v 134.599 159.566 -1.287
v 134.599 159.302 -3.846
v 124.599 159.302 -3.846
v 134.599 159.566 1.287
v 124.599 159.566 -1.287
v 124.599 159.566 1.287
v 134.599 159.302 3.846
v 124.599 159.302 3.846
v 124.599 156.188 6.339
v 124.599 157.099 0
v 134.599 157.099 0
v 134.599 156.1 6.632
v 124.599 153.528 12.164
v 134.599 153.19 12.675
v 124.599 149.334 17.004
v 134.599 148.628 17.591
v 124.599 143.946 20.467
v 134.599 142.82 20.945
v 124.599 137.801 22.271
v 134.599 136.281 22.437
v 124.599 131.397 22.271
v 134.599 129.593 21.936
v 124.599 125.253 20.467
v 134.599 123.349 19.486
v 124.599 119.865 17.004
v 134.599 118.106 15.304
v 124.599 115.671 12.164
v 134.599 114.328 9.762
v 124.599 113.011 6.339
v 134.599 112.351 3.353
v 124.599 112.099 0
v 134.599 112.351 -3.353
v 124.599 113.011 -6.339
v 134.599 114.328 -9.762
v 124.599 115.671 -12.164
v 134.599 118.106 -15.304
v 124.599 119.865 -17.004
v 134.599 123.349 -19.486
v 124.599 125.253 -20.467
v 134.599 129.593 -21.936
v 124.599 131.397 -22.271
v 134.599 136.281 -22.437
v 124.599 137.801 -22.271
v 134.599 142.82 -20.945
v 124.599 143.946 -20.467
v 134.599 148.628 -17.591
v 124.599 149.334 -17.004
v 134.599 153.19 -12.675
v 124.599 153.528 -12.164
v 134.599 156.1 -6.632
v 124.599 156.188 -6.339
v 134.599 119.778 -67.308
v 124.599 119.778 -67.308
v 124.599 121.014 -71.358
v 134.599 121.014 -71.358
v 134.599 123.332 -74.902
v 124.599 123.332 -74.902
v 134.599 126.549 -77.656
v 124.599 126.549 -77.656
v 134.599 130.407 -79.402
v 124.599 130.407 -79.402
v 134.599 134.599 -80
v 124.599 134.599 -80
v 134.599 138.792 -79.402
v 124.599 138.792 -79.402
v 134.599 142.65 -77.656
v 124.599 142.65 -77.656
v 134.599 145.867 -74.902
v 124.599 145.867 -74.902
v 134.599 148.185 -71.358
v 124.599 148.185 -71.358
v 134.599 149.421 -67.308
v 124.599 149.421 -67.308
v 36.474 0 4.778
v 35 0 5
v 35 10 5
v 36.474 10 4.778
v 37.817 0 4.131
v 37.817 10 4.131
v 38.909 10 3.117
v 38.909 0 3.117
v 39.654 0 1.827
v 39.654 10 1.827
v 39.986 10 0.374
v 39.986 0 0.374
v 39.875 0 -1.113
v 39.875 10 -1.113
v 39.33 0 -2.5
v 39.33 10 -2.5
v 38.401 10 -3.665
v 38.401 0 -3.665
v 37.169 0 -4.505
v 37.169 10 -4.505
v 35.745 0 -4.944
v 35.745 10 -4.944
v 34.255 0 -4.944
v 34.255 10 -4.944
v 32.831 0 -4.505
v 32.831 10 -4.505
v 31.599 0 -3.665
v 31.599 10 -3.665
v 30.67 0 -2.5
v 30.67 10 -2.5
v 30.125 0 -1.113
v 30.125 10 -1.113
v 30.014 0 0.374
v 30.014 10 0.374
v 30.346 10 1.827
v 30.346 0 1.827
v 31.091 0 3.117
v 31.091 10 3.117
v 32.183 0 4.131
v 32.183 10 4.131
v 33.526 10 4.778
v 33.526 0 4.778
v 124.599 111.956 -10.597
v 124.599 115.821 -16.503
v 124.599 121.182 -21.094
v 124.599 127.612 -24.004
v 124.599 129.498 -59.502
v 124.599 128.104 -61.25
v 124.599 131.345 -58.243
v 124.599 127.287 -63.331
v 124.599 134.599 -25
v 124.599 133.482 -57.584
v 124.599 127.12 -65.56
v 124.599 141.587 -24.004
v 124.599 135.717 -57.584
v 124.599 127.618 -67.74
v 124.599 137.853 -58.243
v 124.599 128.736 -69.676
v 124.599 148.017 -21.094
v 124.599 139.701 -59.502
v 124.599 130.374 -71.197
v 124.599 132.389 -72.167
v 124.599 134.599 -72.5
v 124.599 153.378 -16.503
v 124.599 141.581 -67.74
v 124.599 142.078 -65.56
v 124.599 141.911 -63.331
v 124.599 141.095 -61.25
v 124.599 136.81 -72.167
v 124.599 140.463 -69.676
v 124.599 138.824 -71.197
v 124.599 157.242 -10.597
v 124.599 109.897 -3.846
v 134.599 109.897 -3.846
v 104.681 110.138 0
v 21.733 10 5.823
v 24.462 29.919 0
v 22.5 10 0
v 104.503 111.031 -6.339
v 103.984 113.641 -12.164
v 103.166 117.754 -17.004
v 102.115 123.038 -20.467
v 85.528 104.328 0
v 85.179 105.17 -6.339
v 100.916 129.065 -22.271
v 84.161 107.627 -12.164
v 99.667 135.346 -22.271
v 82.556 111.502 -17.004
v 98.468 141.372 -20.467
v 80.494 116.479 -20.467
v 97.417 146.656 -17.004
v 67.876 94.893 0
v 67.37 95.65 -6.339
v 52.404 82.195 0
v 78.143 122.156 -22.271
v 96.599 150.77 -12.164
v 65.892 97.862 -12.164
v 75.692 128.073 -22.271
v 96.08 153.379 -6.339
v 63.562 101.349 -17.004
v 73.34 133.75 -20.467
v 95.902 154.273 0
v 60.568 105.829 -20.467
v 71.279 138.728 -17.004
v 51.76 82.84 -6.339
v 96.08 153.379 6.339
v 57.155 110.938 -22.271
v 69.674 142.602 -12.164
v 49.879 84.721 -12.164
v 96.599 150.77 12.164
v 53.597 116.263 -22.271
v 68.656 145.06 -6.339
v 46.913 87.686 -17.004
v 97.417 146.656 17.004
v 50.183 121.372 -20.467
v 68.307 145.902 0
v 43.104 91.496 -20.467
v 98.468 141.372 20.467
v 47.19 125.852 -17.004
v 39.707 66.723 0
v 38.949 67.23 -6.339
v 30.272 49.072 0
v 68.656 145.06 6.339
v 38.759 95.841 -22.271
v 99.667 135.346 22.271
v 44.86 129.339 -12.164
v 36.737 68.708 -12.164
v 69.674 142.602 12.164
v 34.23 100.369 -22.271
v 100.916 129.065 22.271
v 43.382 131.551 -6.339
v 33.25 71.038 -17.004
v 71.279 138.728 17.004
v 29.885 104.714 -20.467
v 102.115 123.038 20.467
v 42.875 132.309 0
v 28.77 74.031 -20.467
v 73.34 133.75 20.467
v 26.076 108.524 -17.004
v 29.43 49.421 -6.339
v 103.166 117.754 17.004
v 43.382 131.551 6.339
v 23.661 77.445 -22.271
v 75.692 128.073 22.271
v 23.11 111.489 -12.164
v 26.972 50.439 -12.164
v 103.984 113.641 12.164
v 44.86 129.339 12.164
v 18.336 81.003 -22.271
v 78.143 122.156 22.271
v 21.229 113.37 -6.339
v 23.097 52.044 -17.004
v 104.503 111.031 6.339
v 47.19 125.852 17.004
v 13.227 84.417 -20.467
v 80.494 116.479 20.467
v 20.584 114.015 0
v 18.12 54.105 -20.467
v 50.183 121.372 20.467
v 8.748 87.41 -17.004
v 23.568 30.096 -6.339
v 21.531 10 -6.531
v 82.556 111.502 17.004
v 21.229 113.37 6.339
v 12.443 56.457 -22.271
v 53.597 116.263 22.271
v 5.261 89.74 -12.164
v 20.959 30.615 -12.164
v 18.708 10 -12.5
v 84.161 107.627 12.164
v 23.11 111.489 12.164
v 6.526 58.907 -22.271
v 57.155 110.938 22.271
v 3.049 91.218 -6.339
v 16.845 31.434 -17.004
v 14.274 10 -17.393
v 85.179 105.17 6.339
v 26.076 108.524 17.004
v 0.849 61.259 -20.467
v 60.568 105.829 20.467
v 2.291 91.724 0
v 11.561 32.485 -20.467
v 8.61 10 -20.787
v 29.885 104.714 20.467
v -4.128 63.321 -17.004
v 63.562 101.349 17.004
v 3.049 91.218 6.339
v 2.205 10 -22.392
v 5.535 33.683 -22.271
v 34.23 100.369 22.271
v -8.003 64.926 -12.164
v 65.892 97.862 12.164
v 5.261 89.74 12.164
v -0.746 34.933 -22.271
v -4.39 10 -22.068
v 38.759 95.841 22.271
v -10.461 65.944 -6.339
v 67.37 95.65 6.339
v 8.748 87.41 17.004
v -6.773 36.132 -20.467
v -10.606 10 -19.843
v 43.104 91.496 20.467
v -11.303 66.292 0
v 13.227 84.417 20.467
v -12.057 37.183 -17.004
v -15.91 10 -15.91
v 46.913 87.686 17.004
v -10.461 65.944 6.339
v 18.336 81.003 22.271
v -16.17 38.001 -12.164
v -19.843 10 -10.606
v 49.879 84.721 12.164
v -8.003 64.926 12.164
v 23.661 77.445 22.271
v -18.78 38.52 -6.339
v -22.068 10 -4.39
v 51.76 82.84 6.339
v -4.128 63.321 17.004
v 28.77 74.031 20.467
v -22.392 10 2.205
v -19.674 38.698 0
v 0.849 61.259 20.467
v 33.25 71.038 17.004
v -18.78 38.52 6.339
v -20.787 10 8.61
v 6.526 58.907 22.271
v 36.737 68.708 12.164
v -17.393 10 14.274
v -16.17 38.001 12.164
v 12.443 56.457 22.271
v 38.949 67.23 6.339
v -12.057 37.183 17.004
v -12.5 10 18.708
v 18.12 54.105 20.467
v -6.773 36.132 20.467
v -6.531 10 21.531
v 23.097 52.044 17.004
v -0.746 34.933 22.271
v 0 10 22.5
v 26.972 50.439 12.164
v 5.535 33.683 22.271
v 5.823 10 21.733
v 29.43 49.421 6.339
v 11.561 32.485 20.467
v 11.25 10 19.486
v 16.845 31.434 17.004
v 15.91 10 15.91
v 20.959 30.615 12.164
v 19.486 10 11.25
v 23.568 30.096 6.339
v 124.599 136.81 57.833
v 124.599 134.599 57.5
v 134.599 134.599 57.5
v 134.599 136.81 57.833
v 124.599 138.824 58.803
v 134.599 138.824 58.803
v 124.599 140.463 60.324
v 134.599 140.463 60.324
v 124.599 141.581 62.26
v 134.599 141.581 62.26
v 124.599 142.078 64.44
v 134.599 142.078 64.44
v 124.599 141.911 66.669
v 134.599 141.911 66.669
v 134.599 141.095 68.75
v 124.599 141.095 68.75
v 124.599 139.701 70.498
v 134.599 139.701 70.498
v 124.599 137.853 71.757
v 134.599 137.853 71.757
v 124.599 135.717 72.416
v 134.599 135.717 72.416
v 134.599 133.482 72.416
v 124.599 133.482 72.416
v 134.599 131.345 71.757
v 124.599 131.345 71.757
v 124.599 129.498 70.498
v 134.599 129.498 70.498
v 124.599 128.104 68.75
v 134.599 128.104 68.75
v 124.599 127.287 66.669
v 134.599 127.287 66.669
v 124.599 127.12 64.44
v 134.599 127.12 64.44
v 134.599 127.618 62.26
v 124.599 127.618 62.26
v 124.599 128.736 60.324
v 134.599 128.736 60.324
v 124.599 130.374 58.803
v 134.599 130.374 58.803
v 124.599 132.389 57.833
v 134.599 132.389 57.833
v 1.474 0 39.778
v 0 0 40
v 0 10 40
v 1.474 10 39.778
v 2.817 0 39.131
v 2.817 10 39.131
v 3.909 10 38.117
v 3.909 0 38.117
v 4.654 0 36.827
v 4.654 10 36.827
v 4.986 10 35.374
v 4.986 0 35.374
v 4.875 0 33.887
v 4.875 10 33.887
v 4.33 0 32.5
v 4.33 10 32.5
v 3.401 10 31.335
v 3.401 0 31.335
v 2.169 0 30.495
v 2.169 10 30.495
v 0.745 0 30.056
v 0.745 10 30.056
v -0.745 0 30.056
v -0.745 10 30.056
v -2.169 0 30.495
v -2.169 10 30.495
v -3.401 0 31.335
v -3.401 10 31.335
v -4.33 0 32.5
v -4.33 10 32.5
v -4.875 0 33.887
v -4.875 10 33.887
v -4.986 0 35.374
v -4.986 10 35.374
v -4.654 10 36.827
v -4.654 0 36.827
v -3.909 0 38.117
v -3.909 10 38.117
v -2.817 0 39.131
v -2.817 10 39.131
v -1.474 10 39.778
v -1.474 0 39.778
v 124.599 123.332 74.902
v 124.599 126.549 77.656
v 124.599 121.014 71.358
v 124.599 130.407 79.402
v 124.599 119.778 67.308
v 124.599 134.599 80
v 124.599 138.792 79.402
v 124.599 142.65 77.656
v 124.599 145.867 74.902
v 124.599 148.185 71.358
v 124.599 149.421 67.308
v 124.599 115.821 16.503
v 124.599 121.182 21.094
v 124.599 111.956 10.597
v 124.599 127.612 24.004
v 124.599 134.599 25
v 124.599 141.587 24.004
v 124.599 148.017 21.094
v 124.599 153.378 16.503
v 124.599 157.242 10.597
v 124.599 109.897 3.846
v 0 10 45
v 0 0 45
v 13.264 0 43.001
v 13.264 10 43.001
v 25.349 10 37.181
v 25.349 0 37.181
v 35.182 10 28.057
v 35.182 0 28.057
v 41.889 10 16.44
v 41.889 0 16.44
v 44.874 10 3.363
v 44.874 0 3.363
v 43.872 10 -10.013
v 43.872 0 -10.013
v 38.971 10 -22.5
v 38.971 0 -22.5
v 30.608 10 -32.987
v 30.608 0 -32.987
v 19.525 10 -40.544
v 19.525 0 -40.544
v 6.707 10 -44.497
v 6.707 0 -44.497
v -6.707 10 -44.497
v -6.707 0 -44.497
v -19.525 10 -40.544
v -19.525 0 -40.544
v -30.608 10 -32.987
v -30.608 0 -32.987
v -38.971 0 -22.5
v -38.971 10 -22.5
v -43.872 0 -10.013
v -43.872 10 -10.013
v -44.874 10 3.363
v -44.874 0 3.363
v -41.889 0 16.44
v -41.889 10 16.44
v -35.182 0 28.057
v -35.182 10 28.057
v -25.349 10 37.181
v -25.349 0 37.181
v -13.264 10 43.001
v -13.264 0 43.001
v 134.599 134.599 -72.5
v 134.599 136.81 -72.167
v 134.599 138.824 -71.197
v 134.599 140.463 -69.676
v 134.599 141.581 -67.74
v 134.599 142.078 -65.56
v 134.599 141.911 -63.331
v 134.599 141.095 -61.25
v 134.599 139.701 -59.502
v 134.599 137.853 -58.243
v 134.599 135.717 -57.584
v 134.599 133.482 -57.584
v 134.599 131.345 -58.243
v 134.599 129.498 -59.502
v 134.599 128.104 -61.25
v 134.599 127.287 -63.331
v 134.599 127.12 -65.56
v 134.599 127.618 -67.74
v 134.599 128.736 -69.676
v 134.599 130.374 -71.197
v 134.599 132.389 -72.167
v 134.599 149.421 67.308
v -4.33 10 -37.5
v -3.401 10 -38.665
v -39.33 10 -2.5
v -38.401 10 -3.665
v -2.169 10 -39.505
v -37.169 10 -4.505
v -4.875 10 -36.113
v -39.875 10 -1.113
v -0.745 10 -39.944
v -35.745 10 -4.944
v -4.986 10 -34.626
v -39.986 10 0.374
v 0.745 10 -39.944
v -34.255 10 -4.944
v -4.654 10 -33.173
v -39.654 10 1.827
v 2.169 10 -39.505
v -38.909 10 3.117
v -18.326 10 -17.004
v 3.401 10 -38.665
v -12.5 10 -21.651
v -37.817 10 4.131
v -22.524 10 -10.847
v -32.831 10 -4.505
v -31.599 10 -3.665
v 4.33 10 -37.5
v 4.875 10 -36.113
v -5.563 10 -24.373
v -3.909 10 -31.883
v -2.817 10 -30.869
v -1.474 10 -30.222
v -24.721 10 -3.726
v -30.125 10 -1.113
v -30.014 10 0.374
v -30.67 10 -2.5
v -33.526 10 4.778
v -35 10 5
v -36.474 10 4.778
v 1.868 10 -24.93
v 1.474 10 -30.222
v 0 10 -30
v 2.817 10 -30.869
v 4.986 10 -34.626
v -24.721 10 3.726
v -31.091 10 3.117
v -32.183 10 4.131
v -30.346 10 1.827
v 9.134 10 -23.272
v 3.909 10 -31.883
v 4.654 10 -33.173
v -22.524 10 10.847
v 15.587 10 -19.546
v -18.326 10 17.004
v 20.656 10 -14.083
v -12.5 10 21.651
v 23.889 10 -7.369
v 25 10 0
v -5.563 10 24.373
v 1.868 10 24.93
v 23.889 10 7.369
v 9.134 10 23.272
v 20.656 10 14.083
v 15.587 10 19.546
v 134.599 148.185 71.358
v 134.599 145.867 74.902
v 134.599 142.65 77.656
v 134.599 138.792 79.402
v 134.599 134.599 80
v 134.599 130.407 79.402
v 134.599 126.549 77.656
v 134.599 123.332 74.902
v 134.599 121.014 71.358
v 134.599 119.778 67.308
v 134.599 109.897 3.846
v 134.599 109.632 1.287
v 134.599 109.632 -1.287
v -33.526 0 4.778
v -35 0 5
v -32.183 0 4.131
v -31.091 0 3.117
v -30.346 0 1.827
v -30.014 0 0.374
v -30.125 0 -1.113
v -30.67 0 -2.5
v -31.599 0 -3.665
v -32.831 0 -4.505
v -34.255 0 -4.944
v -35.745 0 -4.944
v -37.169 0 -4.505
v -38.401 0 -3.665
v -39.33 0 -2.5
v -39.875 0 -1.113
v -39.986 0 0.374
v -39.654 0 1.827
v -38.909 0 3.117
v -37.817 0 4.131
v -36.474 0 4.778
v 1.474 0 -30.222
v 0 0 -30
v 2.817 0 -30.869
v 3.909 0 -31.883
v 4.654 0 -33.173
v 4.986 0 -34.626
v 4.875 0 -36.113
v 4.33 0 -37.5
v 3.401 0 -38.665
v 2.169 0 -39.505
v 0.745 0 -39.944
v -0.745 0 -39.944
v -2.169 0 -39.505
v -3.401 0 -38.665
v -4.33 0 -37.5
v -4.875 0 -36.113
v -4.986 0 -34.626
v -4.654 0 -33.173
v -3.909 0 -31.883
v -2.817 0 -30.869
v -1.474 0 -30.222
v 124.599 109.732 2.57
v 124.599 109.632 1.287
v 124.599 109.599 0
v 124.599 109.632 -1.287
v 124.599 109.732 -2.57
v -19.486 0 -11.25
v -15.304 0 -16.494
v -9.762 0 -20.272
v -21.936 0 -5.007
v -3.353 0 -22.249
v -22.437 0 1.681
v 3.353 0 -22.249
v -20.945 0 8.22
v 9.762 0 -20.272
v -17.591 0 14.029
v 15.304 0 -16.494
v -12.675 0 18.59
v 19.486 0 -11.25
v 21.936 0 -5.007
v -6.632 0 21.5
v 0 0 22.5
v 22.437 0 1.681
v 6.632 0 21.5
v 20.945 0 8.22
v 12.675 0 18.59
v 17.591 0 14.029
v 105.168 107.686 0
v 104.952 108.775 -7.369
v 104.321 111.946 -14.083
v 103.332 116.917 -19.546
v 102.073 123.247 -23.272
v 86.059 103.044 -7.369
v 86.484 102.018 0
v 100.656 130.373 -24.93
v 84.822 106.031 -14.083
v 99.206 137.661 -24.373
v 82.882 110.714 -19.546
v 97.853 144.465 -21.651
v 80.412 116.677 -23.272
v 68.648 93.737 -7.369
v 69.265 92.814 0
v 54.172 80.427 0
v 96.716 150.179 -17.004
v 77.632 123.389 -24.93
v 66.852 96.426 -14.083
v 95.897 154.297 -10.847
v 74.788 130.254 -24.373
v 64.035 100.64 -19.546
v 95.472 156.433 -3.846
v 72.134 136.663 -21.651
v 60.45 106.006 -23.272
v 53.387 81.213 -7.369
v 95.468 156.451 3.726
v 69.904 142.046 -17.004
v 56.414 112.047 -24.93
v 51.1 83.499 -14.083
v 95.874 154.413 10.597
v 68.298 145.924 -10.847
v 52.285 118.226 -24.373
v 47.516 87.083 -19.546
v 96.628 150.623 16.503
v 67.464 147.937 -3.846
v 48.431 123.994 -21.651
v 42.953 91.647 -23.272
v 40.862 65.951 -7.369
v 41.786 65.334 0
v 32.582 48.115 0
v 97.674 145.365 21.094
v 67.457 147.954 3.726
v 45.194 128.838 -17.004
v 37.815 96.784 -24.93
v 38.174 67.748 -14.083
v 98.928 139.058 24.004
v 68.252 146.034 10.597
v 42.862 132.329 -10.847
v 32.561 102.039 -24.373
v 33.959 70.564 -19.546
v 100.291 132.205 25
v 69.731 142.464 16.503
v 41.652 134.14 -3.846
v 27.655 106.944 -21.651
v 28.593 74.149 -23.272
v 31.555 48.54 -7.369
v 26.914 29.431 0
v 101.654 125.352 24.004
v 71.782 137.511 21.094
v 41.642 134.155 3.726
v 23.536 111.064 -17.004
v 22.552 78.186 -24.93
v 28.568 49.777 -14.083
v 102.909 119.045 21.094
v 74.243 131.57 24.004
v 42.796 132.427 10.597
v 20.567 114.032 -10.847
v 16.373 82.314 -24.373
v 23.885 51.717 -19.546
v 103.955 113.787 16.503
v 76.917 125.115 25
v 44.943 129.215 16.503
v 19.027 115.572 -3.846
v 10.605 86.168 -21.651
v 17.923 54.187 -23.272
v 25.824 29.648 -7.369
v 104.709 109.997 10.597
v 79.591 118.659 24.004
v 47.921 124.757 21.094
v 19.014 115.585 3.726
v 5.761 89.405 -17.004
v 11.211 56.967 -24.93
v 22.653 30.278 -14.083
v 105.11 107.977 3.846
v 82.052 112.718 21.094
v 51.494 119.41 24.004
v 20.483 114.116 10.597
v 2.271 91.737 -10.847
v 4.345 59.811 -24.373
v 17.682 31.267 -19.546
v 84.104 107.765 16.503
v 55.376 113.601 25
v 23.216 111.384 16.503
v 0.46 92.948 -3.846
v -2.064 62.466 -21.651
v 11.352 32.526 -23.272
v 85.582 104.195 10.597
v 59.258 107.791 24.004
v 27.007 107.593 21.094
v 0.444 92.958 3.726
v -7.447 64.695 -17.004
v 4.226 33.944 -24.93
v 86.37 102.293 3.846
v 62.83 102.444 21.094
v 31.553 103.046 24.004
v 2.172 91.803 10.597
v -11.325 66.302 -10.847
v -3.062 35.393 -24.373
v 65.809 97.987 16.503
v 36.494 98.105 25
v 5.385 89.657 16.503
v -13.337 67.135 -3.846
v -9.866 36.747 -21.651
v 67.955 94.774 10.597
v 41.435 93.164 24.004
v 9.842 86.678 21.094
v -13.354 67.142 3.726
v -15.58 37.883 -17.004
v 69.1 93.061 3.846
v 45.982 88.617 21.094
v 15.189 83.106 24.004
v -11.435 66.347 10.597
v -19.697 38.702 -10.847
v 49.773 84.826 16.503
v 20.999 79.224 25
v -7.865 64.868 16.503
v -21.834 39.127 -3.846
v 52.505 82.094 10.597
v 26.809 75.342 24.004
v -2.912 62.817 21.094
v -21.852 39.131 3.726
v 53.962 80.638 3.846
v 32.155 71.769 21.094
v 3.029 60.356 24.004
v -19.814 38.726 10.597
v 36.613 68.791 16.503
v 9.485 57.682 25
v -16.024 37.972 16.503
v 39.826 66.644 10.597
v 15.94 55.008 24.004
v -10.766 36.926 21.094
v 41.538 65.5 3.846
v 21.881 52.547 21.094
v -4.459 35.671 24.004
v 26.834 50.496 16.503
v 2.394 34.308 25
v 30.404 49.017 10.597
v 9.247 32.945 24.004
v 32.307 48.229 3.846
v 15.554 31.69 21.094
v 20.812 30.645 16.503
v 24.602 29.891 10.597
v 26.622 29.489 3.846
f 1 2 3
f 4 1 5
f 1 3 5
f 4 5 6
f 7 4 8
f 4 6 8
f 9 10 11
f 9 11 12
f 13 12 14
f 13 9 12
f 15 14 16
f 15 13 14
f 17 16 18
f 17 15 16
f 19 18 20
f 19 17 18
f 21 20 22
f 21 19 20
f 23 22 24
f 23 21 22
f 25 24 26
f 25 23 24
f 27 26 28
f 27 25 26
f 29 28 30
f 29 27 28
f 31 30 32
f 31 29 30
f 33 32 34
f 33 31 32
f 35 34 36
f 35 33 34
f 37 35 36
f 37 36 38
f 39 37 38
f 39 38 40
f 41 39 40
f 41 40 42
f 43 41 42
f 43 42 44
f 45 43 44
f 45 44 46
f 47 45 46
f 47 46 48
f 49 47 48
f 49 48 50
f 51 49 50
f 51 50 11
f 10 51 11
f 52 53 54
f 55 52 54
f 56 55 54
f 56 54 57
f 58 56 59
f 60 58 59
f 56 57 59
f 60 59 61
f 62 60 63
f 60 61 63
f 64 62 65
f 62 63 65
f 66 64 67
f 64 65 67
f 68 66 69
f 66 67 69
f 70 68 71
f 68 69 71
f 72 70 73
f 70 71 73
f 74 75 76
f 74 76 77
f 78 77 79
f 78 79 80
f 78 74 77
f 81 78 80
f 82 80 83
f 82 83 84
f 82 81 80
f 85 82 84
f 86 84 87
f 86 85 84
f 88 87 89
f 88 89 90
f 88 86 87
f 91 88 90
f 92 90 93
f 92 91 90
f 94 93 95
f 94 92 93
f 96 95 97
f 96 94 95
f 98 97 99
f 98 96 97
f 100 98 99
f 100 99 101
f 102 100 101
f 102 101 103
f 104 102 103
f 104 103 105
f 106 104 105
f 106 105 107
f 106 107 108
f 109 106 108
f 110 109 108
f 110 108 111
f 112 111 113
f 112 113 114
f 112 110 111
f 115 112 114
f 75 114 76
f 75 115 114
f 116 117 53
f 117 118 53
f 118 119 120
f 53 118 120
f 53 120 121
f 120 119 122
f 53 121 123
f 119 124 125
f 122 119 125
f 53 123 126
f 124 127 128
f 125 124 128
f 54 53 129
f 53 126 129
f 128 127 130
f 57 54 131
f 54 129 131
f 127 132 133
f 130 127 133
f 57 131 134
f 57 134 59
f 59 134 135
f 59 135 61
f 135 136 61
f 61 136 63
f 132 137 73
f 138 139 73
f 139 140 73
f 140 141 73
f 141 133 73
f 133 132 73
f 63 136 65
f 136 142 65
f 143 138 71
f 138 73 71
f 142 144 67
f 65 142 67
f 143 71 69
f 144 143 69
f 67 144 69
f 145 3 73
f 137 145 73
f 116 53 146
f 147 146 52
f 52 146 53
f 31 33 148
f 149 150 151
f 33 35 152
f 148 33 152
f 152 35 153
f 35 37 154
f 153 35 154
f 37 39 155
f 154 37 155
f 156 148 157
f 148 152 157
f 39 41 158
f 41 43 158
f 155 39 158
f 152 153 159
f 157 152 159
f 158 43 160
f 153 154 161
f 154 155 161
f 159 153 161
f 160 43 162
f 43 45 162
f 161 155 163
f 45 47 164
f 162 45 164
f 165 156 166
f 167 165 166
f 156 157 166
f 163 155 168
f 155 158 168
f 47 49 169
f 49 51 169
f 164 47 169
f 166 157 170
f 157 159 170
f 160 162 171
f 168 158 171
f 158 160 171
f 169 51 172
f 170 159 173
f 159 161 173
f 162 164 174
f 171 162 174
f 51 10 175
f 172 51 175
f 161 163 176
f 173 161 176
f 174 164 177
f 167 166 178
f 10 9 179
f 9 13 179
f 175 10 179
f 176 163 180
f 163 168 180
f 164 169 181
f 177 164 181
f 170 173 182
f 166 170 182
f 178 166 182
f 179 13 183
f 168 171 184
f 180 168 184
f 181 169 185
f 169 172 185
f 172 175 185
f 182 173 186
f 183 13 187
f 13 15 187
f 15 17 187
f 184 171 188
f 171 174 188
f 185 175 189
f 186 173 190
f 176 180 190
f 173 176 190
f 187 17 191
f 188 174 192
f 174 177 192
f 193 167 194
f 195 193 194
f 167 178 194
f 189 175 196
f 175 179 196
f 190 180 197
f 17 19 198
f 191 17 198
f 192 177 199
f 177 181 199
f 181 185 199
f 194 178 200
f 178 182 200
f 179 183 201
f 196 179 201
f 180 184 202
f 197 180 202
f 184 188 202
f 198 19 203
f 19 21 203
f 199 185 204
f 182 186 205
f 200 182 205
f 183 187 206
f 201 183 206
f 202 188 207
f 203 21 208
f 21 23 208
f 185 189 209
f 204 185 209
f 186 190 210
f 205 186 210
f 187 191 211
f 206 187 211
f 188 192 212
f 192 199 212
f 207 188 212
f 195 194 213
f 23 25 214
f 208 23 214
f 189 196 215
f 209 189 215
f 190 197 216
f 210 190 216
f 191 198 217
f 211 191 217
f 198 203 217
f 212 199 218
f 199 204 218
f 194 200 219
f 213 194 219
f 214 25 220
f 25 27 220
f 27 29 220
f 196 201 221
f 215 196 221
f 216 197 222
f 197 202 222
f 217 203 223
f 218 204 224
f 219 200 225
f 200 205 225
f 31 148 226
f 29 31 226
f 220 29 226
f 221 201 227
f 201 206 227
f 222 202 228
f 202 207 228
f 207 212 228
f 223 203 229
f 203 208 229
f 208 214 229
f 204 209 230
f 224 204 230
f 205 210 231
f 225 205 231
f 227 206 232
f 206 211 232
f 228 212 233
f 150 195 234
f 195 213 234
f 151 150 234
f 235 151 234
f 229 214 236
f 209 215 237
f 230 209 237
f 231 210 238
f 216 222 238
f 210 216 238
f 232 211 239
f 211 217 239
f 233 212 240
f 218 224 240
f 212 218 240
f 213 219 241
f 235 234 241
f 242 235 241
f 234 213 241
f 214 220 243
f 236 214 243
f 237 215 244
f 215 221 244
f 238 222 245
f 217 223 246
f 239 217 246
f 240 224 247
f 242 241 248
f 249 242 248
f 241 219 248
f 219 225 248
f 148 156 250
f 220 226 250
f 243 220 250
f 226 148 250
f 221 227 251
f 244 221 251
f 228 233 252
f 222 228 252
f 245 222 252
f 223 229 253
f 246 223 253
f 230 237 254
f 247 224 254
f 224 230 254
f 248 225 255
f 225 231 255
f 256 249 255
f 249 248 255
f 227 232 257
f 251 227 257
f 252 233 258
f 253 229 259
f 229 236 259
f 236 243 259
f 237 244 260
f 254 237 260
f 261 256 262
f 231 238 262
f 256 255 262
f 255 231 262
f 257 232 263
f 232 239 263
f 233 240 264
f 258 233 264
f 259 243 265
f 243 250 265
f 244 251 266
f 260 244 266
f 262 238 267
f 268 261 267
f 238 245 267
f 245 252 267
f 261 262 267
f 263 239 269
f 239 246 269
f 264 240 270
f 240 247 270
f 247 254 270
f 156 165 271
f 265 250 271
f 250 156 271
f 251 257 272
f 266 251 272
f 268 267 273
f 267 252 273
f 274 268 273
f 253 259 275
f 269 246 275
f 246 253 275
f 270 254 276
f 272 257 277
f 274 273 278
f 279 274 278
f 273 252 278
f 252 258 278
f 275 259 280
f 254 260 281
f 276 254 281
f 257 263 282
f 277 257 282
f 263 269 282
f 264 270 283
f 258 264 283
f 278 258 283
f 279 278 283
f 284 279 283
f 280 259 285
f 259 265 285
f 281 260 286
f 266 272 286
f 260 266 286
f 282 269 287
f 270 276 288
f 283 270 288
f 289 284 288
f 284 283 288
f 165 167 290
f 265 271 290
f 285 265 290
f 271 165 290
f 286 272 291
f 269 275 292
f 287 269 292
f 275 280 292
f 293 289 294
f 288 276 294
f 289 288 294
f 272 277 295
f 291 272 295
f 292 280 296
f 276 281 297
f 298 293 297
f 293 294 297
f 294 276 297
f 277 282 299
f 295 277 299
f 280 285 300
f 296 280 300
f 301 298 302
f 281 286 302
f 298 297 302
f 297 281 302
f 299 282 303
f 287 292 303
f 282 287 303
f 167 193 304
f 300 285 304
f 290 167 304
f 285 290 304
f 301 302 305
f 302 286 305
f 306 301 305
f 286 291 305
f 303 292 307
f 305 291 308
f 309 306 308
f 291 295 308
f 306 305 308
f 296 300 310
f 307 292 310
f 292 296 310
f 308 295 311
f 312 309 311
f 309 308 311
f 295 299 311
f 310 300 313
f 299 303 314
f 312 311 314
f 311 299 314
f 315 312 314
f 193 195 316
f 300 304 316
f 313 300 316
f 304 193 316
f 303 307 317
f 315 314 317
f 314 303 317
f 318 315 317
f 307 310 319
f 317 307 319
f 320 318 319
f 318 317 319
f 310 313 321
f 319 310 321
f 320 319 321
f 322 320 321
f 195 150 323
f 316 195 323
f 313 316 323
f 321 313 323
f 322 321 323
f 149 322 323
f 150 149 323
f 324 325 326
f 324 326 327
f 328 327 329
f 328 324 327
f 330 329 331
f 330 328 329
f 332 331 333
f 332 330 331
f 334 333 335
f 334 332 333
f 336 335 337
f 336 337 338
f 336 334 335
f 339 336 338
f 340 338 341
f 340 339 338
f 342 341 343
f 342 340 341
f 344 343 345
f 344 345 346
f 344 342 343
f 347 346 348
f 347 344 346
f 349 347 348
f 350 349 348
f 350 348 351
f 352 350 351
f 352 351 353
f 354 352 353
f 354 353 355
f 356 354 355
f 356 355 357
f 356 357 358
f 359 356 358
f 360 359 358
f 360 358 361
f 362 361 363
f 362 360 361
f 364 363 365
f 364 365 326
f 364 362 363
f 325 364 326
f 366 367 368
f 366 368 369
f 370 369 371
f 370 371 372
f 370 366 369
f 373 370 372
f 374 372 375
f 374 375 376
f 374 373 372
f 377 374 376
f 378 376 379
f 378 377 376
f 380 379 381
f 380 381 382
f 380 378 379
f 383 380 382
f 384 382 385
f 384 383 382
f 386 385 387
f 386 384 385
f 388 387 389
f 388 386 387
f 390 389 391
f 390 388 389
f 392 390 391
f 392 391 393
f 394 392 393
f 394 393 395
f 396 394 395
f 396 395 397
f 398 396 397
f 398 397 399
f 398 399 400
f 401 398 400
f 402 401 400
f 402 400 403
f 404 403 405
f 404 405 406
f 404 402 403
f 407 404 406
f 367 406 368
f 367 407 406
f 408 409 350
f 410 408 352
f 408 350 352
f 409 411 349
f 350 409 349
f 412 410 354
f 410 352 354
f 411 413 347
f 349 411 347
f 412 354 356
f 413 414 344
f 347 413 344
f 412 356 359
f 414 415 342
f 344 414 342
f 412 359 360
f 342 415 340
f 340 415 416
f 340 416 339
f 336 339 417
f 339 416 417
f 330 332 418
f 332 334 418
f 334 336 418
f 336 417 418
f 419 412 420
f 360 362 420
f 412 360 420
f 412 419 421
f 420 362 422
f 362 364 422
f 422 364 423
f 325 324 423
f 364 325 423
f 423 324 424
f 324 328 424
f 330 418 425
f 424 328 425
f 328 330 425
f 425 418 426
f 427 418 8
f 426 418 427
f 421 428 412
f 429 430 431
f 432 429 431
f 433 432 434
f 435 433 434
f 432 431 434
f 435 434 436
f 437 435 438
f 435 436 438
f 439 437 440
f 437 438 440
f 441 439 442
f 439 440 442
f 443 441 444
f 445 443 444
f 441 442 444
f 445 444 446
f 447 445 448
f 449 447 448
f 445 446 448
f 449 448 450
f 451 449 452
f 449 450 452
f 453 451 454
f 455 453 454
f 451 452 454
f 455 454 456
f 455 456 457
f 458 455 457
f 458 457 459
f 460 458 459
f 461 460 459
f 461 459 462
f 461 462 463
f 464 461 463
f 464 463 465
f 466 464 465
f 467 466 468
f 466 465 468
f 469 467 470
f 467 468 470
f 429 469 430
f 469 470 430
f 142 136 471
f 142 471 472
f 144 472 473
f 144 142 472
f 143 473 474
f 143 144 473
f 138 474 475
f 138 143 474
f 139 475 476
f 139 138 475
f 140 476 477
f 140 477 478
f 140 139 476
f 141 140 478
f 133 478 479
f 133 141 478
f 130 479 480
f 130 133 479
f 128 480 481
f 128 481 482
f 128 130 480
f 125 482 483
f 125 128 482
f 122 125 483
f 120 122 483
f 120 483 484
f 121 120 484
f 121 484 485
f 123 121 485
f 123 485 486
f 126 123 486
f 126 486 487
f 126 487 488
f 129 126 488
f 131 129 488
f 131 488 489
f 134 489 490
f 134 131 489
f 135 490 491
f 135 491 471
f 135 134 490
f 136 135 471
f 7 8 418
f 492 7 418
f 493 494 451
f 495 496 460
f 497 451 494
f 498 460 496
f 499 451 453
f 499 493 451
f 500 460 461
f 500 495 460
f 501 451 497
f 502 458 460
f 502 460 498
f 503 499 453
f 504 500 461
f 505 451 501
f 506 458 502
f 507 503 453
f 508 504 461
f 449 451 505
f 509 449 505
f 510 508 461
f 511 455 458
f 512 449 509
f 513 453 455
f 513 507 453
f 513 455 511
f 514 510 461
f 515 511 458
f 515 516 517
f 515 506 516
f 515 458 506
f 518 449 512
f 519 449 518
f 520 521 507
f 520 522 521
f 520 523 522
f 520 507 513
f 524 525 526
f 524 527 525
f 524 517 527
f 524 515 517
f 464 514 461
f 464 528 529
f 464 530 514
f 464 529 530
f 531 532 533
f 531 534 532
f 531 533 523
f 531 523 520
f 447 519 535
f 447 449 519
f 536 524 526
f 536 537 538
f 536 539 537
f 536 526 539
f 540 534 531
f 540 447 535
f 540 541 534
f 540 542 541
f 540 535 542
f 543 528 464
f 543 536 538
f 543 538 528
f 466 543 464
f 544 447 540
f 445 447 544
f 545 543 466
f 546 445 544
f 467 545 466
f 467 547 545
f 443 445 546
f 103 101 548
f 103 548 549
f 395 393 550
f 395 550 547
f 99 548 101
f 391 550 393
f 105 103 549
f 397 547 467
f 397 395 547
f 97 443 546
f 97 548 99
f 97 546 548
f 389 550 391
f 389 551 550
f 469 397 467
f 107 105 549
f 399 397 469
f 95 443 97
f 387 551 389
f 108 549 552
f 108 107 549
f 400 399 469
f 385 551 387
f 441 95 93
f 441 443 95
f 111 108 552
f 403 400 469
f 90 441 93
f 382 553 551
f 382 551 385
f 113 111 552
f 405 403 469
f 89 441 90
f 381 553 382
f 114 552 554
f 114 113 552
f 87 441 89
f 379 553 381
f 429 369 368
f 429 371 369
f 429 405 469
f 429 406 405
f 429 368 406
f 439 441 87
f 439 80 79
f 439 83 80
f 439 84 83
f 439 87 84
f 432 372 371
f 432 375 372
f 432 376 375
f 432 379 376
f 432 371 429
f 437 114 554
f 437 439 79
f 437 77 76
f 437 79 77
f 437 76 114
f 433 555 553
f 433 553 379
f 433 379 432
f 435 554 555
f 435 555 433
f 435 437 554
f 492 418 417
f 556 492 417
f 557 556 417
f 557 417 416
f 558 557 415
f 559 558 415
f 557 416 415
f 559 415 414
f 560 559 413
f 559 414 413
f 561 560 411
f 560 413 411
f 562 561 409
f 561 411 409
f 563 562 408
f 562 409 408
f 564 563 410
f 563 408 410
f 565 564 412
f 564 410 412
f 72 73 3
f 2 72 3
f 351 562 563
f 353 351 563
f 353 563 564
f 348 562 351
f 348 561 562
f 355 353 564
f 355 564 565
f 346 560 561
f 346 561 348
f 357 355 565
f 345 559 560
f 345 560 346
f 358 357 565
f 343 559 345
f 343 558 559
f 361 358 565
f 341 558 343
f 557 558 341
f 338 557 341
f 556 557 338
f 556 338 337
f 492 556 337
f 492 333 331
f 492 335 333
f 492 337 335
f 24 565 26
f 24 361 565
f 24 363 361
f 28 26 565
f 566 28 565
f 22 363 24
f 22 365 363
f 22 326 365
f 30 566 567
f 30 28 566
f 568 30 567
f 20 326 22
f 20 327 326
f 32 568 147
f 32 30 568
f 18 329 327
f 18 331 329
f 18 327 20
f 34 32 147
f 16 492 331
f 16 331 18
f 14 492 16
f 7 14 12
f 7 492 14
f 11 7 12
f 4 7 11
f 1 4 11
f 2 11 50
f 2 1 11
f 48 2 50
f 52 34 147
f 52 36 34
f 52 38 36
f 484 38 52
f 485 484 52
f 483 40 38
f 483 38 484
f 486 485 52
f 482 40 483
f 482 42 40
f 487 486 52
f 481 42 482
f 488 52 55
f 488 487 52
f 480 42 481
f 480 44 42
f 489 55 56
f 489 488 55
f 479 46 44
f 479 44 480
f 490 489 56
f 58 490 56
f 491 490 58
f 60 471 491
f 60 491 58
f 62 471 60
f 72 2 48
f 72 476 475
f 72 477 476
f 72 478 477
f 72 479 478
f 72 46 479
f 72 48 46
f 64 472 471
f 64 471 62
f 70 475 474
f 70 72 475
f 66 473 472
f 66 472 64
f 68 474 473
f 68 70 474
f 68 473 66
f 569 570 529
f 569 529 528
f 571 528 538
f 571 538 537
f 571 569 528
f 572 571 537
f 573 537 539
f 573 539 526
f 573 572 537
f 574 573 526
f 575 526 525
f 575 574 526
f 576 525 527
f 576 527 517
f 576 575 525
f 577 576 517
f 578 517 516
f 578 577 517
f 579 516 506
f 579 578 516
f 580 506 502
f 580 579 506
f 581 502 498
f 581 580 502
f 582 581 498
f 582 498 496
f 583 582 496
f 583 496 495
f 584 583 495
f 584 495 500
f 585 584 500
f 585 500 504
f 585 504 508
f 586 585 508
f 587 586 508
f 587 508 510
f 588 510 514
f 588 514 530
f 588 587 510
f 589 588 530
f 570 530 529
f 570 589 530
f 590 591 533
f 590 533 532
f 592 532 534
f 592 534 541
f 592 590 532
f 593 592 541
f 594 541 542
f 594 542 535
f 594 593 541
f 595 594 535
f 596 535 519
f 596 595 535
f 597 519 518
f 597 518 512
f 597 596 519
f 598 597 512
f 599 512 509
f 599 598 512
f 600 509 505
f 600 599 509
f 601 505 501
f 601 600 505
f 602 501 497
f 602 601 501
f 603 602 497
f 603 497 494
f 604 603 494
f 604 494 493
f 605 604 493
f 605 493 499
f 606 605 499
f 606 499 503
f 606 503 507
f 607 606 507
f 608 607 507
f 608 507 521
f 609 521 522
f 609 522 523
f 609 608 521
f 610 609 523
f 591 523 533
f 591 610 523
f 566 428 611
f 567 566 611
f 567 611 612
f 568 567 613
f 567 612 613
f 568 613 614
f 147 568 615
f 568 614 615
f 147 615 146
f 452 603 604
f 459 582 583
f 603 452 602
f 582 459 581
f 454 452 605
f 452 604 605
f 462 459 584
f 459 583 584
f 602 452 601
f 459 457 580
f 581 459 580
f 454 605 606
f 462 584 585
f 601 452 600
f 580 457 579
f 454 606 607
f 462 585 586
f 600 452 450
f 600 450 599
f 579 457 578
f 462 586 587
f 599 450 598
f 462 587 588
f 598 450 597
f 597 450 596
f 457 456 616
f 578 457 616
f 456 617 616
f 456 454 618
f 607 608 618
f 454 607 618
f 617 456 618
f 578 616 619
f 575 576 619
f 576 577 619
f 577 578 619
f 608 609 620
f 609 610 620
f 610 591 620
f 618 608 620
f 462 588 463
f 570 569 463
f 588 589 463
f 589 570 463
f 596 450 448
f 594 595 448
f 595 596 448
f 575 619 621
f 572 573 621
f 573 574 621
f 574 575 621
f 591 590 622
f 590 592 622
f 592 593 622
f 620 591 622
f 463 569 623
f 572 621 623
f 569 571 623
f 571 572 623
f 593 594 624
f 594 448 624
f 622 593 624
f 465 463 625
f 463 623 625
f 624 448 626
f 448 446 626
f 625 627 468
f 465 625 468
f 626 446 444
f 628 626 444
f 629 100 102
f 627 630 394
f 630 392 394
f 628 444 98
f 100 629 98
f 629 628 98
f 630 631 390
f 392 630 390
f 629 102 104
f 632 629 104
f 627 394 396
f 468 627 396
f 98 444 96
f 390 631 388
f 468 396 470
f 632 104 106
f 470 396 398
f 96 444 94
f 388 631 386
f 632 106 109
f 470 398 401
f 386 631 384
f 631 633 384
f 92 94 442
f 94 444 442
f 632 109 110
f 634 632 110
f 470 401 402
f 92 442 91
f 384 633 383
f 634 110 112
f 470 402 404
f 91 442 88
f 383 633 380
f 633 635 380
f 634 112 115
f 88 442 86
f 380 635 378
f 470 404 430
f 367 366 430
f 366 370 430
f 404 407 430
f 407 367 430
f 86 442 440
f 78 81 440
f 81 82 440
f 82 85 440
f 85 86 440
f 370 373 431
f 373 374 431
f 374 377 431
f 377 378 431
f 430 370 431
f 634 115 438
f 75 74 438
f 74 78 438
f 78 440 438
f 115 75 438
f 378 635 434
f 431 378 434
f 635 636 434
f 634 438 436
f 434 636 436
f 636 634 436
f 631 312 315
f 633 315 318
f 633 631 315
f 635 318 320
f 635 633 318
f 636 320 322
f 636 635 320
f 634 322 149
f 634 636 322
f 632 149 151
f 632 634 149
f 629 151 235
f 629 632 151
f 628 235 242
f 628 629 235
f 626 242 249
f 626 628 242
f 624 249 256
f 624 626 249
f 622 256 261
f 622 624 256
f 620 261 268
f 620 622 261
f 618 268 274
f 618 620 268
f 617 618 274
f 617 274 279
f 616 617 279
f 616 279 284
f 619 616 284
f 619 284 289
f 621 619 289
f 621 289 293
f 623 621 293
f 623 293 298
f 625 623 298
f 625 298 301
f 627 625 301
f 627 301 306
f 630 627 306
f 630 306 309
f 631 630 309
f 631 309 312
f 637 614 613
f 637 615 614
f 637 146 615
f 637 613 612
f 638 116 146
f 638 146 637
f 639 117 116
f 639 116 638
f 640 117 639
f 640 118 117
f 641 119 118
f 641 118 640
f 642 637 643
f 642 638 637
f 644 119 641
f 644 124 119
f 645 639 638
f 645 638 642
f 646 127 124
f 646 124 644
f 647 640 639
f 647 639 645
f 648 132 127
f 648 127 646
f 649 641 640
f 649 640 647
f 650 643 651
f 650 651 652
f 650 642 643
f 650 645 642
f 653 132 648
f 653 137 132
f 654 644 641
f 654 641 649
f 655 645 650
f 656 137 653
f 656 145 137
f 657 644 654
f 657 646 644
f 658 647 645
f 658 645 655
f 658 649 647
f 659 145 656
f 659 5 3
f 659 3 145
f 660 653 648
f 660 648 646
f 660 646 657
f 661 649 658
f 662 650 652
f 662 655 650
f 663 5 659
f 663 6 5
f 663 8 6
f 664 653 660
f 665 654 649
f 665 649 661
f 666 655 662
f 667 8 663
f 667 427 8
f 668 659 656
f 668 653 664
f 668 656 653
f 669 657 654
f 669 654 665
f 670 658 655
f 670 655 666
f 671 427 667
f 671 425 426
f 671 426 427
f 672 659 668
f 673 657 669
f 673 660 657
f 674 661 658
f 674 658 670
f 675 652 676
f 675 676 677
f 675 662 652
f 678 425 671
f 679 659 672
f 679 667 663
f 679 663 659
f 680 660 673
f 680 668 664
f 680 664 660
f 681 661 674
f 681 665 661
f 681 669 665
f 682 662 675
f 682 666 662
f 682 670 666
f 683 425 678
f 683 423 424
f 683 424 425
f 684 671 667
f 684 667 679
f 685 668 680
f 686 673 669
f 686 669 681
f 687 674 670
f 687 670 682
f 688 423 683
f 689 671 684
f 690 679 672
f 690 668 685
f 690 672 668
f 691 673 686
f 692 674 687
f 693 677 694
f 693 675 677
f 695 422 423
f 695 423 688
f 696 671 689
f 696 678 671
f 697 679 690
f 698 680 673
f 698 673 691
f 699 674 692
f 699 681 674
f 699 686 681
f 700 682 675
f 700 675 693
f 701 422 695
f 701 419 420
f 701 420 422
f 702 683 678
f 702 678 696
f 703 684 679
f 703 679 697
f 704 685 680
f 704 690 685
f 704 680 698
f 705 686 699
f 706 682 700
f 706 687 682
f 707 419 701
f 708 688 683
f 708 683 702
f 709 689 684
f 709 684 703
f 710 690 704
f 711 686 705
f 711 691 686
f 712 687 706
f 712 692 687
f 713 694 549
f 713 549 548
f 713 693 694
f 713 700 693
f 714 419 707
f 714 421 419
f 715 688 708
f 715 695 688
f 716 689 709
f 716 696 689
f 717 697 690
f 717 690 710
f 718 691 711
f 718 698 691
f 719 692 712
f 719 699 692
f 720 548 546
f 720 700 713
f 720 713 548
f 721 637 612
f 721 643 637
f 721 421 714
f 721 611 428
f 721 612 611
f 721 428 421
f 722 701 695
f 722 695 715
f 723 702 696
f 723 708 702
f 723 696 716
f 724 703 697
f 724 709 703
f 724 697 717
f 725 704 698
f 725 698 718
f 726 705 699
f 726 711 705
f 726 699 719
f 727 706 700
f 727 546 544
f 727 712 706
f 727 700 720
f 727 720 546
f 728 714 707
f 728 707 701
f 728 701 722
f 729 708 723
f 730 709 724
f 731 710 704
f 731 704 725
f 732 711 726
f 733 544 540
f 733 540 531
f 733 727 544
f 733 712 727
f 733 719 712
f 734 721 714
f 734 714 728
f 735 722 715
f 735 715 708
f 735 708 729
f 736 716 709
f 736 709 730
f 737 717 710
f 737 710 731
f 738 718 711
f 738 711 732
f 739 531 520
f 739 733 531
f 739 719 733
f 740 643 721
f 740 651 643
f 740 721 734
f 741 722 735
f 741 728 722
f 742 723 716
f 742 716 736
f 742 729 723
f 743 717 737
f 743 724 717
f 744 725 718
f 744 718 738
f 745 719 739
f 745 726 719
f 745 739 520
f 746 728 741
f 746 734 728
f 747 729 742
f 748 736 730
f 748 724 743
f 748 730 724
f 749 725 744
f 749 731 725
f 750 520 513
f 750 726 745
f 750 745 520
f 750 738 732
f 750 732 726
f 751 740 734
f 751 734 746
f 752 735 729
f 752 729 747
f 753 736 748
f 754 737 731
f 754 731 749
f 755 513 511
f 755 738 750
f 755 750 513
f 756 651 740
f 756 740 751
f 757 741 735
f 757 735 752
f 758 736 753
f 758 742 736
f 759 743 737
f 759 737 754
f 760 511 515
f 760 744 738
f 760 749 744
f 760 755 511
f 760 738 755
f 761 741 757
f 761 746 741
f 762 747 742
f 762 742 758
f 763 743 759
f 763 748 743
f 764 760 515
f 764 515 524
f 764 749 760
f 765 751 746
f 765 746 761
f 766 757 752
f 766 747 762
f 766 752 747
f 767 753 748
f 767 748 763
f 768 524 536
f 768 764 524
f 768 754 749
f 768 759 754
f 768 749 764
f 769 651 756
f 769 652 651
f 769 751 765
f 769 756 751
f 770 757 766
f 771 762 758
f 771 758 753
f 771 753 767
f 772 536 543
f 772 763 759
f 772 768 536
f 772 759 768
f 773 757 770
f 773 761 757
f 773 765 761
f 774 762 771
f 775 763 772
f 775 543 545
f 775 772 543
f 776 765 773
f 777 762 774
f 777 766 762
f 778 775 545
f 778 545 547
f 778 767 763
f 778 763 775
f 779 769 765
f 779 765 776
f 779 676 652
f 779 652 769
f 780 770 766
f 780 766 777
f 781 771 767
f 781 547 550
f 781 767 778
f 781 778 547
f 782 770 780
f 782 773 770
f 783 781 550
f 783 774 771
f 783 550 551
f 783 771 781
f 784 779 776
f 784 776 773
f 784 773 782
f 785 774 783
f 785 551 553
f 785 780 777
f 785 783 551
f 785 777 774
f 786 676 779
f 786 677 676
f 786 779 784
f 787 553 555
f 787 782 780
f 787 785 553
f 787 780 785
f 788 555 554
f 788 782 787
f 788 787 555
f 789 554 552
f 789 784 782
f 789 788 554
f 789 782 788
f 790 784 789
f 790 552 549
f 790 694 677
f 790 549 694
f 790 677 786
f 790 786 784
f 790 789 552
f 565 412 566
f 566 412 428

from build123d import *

# Parameters (mm, degrees)
SKETCH1_R           = 45
SKETCH1_R_2         = 5
SKETCH1_R_3         = 22.5
BOSS_EXTRUDE1_DEPTH = 10
SKETCH3_R           = 25
SKETCH3_R_2         = 22.5
SKETCH4_R           = 7.5
SKETCH4_R_2         = 25
SKETCH4_R_3         = 22.5
BOSS_EXTRUDE6_DEPTH = 10


with BuildPart() as part:
    # Sketch1 → Boss-Extrude1 (new body)
    with BuildSketch(Plane(origin=(0, 0, 0), x_dir=(1, 0, 0), z_dir=(0, 1, 0))):
        with Locations(Location((0, 0, 0), (0, 0, 270))):
            Circle(SKETCH1_R)
        with Locations(Location((0, 35, 0), (0, 0, 270))):
            Circle(SKETCH1_R_2, mode=Mode.SUBTRACT)
        with Locations(Location((35, 0, 0), (0, 0, 270))):
            Circle(SKETCH1_R_2, mode=Mode.SUBTRACT)
        with Locations(Location((0, -35, 0), (0, 0, 270))):
            Circle(SKETCH1_R_2, mode=Mode.SUBTRACT)
        with Locations(Location((-35, 0, 0), (0, 0, 270))):
            Circle(SKETCH1_R_2, mode=Mode.SUBTRACT)
        with Locations(Location((0, 0, 0), (0, 0, 270))):
            Circle(SKETCH1_R_3, mode=Mode.SUBTRACT)
    extrude(amount=BOSS_EXTRUDE1_DEPTH)

    # Sweep1: sweep along a path in Sketch2
    with BuildLine(Plane.XY) as sweep1_path:
        ThreePointArc((124.599357944, 135), (36.211010295, 98.388347648), (-0.400642056, 10))
    # Sketch3 → Sweep1 (sweep)
    with BuildSketch(Plane(origin=(0, 10, 0), x_dir=(1, 0, 0), z_dir=(0, 1, 0))):
        Circle(SKETCH3_R)
        Circle(SKETCH3_R_2, mode=Mode.SUBTRACT)
    sweep(path=sweep1_path.line)

    # Sketch4 → Boss-Extrude6 (add)
    # profile 1 of 3: a face of its own
    with BuildSketch(Plane(origin=(124.599357944, 0, 0), x_dir=(0, 0, -1), z_dir=(1, 0, 0))):
        with BuildLine():
            ThreePointArc((-3.846153846, 109.8969876), (-25, 134.599357944), (-3.846153846, 159.301728287))
            Line((-3.846153846, 159.301728287), (-67.307692308, 149.42078015))
            ThreePointArc((-67.307692308, 149.42078015), (-80, 134.599357944), (-67.307692308, 119.777935738))
            Line((-67.307692308, 119.777935738), (-3.846153846, 109.8969876))
        make_face()
        with Locations((-65, 134.599357944)):
            Circle(SKETCH4_R, mode=Mode.SUBTRACT)
    # profile 2 of 3: a face of its own
    with BuildSketch(Plane(origin=(124.599357944, 0, 0), x_dir=(0, 0, -1), z_dir=(1, 0, 0))):
        with BuildLine():
            Line((67.307692308, 149.42078015), (3.846153846, 159.301728287))
            ThreePointArc((3.846153846, 159.301728287), (18.988863133, 150.860448833), (25, 134.599357944))
            ThreePointArc((25, 134.599357944), (18.988863133, 118.338267054), (3.846153846, 109.8969876))
            Line((3.846153846, 109.8969876), (67.307692308, 119.777935738))
            ThreePointArc((67.307692308, 119.777935738), (80, 134.599357944), (67.307692308, 149.42078015))
        make_face()
        with Locations((65, 134.599357944)):
            Circle(SKETCH4_R, mode=Mode.SUBTRACT)
    # profile 3 of 3: a face of its own
    with BuildSketch(Plane(origin=(124.599357944, 0, 0), x_dir=(0, 0, -1), z_dir=(1, 0, 0))):
        with Locations((0, 134.599357944)):
            Circle(SKETCH4_R_2)
        with Locations(Location((0, 134.599357944, 0), (0, 0, 90))):
            Circle(SKETCH4_R_3, mode=Mode.SUBTRACT)
    extrude(amount=BOSS_EXTRUDE6_DEPTH)


solid = part.part
